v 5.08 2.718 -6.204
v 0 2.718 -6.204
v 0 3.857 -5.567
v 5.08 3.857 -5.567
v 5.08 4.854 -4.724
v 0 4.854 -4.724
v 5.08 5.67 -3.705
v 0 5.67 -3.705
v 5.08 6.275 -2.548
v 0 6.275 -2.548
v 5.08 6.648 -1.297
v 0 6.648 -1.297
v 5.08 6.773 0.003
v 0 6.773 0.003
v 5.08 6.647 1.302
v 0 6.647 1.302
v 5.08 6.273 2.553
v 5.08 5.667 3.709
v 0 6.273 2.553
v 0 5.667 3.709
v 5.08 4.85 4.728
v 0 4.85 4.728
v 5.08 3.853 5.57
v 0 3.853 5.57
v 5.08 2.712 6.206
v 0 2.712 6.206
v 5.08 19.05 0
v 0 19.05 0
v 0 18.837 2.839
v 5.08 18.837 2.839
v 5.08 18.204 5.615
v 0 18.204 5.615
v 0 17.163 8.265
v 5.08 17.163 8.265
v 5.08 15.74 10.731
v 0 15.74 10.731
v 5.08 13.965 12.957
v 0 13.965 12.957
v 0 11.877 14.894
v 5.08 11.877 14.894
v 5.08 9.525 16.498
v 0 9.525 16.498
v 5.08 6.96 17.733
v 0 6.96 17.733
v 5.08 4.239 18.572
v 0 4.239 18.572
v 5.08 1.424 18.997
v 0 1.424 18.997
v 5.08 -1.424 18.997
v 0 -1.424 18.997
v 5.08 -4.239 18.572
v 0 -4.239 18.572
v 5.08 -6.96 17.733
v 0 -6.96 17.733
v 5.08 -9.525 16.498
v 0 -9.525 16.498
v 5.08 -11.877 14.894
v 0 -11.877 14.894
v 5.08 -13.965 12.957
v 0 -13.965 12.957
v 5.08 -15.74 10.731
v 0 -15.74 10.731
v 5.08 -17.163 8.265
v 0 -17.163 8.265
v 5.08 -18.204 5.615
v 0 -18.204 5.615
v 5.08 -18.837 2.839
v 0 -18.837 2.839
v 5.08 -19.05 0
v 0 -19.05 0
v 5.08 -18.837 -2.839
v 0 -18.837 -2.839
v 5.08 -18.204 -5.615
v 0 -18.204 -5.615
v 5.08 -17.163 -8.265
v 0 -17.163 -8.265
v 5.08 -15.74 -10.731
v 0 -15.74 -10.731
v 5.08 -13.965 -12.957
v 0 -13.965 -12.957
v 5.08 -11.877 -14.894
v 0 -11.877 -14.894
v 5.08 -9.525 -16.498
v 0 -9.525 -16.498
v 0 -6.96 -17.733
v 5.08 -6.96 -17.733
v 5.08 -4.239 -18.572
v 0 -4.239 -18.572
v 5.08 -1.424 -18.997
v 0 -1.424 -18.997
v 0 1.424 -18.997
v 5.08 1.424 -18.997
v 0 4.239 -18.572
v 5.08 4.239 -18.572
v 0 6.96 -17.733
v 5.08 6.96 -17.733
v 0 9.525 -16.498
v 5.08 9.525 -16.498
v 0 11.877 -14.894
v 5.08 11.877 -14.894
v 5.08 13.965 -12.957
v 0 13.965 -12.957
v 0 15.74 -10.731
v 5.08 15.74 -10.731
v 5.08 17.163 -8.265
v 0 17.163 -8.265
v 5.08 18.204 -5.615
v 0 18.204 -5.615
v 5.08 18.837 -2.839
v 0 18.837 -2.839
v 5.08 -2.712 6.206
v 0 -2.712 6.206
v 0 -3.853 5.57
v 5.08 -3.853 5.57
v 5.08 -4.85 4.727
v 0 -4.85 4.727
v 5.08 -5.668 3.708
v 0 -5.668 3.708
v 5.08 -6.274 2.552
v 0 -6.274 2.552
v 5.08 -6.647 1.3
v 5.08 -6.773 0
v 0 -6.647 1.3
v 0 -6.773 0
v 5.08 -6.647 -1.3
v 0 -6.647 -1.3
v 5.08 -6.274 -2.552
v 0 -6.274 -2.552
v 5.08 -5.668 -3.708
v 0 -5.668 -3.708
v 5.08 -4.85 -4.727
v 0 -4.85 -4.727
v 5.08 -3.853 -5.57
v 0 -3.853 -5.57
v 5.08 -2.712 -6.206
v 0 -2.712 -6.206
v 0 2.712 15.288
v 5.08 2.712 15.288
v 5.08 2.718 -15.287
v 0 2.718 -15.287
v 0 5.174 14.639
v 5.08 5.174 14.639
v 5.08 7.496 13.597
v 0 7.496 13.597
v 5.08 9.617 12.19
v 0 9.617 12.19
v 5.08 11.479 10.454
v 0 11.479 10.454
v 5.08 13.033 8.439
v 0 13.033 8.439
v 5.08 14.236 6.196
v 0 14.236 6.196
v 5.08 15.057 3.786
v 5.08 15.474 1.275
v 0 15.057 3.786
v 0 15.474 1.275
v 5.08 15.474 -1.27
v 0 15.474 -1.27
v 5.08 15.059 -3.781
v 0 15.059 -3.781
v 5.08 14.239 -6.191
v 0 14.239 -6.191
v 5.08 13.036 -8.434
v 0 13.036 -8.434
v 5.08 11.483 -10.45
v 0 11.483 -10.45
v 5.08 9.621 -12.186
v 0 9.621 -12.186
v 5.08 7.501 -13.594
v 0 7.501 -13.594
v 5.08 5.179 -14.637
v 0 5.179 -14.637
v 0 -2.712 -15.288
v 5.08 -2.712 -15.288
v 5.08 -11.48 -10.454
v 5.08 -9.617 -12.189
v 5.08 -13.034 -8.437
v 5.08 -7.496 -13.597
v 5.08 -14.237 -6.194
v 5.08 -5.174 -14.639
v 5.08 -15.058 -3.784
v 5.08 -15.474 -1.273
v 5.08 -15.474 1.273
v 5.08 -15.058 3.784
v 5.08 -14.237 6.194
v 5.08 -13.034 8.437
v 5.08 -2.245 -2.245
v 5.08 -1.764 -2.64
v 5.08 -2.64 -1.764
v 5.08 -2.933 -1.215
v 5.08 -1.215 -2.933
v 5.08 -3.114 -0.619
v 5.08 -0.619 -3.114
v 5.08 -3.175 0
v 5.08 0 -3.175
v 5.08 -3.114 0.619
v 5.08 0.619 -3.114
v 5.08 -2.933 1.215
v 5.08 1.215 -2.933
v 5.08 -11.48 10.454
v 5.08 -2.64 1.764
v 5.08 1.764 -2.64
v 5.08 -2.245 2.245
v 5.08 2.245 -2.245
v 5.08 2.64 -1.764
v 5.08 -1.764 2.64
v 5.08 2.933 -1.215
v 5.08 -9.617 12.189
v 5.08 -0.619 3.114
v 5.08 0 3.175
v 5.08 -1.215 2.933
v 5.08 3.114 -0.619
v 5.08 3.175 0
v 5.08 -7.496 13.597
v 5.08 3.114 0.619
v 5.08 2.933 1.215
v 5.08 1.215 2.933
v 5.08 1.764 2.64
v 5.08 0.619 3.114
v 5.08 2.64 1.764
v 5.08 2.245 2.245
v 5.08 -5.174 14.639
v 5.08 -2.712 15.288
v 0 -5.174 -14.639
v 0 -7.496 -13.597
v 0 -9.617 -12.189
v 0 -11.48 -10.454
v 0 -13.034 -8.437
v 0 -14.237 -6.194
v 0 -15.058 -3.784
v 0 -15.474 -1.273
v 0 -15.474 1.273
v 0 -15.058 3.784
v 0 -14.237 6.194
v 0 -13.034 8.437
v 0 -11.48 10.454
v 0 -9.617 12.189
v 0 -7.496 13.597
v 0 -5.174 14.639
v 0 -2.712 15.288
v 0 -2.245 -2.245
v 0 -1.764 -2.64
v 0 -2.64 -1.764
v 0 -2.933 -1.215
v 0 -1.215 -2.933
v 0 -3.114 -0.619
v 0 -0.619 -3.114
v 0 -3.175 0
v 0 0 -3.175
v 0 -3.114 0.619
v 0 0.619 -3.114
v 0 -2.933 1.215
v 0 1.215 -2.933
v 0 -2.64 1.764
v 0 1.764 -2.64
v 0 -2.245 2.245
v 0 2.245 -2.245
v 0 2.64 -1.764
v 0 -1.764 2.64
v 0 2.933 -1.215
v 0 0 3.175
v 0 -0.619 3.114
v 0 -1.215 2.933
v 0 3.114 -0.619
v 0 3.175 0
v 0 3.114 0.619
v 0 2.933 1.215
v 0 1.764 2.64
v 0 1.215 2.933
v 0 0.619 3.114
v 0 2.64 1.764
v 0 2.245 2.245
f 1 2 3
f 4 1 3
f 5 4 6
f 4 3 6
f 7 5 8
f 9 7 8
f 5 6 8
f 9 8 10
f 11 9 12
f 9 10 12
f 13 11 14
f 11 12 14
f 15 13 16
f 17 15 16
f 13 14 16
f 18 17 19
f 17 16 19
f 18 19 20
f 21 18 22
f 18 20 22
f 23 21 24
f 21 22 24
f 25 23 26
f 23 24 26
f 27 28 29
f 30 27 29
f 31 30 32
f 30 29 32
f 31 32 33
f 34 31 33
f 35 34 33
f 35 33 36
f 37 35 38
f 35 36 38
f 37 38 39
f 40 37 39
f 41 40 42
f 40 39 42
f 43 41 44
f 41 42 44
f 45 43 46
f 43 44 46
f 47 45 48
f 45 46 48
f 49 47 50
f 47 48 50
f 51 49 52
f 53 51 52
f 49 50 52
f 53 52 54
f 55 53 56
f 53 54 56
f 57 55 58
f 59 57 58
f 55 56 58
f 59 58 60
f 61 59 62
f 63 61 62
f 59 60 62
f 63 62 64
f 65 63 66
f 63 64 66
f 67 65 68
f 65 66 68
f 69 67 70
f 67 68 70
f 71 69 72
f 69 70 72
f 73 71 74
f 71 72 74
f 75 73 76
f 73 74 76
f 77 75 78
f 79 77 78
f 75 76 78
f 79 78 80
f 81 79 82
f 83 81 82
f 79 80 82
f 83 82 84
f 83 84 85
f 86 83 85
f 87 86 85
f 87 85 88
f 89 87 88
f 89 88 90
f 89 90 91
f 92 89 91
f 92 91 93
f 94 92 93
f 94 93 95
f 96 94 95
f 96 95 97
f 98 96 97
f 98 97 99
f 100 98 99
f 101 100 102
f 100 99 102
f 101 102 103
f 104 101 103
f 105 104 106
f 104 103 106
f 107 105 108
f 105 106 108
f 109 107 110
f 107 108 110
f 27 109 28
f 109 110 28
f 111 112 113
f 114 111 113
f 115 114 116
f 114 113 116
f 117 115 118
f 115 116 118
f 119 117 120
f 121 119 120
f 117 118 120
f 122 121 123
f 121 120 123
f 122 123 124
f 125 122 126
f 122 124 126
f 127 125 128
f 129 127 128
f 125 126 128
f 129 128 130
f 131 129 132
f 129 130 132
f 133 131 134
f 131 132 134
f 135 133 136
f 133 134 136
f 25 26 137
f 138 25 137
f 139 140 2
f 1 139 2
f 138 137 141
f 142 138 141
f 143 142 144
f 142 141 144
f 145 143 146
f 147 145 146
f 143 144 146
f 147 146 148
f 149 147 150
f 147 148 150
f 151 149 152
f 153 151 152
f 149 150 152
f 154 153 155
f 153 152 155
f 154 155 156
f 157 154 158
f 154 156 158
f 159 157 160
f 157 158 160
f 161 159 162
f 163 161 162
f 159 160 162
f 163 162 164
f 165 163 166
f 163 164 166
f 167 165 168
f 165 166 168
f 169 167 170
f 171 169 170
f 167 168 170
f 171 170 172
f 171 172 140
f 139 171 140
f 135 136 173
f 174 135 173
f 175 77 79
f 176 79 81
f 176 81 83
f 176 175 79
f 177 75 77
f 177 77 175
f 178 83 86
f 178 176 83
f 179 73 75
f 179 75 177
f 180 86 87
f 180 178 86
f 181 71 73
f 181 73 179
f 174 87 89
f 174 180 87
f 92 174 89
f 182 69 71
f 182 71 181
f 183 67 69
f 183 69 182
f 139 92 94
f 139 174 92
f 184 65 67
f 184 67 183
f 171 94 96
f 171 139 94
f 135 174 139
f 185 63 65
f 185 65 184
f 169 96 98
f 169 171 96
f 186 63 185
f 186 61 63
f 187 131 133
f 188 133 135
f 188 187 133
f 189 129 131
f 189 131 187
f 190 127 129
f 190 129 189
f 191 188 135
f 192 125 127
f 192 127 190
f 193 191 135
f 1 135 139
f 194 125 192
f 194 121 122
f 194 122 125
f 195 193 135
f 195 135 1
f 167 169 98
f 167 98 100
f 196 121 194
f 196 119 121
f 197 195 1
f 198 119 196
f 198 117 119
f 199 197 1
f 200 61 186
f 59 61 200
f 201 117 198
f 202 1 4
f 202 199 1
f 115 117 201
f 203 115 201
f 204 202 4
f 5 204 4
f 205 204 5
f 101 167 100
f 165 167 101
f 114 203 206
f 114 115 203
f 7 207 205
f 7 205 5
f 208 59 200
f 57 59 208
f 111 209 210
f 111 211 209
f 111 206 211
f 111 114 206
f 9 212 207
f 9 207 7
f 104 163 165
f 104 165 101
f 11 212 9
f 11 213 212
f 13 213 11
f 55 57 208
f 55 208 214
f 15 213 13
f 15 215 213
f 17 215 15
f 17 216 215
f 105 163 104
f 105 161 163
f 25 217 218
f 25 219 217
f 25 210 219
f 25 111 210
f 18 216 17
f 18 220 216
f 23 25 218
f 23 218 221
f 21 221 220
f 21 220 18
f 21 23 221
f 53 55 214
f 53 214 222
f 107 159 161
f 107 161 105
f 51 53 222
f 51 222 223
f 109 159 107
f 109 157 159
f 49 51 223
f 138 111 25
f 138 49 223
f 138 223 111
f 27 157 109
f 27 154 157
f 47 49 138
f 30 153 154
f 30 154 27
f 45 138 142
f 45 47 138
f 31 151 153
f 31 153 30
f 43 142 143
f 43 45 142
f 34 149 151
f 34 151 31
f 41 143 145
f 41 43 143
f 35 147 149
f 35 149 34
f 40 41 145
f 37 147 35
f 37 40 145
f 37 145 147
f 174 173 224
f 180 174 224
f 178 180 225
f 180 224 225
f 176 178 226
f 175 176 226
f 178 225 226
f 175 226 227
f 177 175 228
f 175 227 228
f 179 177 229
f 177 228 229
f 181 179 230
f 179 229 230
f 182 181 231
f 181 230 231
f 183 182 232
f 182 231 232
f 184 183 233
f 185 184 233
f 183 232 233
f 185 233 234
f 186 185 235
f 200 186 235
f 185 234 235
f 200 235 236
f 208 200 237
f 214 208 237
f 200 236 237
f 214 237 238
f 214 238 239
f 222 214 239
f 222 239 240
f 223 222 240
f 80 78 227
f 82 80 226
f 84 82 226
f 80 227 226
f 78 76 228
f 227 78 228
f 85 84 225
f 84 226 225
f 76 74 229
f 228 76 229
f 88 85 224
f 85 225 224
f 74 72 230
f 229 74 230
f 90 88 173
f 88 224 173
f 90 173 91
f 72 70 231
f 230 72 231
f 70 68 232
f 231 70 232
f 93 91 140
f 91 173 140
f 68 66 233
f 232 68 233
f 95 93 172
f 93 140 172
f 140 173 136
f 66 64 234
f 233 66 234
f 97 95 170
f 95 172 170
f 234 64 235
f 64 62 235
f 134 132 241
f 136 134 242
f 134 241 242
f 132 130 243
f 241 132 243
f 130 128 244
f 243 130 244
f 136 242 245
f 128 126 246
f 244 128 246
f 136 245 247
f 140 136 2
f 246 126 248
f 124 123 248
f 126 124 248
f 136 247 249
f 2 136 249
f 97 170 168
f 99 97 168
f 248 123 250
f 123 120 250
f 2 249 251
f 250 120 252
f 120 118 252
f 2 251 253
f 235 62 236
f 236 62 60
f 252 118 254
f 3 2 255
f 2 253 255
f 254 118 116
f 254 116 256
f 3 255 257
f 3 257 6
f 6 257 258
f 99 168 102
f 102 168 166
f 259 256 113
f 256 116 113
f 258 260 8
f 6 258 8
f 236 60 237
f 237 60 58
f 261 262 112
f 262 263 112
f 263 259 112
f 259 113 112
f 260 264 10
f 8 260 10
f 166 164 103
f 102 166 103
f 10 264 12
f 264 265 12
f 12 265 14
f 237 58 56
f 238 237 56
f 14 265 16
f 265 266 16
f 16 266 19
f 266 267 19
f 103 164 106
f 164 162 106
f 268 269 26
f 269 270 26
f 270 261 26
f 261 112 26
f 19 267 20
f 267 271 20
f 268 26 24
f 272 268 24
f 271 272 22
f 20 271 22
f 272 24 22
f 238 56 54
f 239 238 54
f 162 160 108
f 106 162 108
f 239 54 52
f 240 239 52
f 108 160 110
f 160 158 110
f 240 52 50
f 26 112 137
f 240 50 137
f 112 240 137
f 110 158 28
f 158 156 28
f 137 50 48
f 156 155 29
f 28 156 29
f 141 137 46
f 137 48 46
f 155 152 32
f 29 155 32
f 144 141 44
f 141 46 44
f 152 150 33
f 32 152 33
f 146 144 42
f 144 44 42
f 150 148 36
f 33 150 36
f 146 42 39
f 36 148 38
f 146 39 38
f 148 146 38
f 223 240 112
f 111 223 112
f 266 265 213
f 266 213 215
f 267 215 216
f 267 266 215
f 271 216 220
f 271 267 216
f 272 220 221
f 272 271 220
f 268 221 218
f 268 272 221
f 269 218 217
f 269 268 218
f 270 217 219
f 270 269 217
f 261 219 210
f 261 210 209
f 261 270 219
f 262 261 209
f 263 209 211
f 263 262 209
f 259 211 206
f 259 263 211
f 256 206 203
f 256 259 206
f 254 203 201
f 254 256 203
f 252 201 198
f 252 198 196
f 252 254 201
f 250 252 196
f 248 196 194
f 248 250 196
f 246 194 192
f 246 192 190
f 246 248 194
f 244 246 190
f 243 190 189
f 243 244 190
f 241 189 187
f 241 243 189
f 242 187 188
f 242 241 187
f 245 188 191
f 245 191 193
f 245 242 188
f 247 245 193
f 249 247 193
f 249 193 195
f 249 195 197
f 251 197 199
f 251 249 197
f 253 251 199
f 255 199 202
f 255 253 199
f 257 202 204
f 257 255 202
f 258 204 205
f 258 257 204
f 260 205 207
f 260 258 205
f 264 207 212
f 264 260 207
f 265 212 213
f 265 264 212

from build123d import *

# Parameters (mm, degrees)
F0_R     = 19.05
F0_R_2   = 3.175
F1_DEPTH = 5.08


with BuildPart() as f1:
    # F0 (on Right) → F1 (new body)
    with BuildSketch(Plane.YZ):
        Circle(F0_R)
        with BuildLine():
            ThreePointArc((-2.712303, -15.287515), (-15.526259, 0), (-2.712303, 15.287515))
            Line((-2.712303, 15.287515), (-2.712303, 6.20612))
            ThreePointArc((-2.712303, 6.20612), (-6.772925, 0), (-2.712303, -6.20612))
            Line((-2.712303, -6.20612), (-2.712303, -15.287515))
        make_face(mode=Mode.SUBTRACT)
        Circle(F0_R_2, mode=Mode.SUBTRACT)
        with BuildLine():
            Line((2.712303, 6.20612), (2.712303, 15.287515))
            ThreePointArc((2.712303, 15.287515), (15.526259, 0.002746), (2.717711, -15.286555))
            Line((2.717711, -15.286555), (2.717711, -6.203754))
            ThreePointArc((2.717711, -6.203754), (6.772924, 0.002951), (2.712303, 6.20612))
        make_face(mode=Mode.SUBTRACT)
    extrude(amount=F1_DEPTH)


solid = f1.part
